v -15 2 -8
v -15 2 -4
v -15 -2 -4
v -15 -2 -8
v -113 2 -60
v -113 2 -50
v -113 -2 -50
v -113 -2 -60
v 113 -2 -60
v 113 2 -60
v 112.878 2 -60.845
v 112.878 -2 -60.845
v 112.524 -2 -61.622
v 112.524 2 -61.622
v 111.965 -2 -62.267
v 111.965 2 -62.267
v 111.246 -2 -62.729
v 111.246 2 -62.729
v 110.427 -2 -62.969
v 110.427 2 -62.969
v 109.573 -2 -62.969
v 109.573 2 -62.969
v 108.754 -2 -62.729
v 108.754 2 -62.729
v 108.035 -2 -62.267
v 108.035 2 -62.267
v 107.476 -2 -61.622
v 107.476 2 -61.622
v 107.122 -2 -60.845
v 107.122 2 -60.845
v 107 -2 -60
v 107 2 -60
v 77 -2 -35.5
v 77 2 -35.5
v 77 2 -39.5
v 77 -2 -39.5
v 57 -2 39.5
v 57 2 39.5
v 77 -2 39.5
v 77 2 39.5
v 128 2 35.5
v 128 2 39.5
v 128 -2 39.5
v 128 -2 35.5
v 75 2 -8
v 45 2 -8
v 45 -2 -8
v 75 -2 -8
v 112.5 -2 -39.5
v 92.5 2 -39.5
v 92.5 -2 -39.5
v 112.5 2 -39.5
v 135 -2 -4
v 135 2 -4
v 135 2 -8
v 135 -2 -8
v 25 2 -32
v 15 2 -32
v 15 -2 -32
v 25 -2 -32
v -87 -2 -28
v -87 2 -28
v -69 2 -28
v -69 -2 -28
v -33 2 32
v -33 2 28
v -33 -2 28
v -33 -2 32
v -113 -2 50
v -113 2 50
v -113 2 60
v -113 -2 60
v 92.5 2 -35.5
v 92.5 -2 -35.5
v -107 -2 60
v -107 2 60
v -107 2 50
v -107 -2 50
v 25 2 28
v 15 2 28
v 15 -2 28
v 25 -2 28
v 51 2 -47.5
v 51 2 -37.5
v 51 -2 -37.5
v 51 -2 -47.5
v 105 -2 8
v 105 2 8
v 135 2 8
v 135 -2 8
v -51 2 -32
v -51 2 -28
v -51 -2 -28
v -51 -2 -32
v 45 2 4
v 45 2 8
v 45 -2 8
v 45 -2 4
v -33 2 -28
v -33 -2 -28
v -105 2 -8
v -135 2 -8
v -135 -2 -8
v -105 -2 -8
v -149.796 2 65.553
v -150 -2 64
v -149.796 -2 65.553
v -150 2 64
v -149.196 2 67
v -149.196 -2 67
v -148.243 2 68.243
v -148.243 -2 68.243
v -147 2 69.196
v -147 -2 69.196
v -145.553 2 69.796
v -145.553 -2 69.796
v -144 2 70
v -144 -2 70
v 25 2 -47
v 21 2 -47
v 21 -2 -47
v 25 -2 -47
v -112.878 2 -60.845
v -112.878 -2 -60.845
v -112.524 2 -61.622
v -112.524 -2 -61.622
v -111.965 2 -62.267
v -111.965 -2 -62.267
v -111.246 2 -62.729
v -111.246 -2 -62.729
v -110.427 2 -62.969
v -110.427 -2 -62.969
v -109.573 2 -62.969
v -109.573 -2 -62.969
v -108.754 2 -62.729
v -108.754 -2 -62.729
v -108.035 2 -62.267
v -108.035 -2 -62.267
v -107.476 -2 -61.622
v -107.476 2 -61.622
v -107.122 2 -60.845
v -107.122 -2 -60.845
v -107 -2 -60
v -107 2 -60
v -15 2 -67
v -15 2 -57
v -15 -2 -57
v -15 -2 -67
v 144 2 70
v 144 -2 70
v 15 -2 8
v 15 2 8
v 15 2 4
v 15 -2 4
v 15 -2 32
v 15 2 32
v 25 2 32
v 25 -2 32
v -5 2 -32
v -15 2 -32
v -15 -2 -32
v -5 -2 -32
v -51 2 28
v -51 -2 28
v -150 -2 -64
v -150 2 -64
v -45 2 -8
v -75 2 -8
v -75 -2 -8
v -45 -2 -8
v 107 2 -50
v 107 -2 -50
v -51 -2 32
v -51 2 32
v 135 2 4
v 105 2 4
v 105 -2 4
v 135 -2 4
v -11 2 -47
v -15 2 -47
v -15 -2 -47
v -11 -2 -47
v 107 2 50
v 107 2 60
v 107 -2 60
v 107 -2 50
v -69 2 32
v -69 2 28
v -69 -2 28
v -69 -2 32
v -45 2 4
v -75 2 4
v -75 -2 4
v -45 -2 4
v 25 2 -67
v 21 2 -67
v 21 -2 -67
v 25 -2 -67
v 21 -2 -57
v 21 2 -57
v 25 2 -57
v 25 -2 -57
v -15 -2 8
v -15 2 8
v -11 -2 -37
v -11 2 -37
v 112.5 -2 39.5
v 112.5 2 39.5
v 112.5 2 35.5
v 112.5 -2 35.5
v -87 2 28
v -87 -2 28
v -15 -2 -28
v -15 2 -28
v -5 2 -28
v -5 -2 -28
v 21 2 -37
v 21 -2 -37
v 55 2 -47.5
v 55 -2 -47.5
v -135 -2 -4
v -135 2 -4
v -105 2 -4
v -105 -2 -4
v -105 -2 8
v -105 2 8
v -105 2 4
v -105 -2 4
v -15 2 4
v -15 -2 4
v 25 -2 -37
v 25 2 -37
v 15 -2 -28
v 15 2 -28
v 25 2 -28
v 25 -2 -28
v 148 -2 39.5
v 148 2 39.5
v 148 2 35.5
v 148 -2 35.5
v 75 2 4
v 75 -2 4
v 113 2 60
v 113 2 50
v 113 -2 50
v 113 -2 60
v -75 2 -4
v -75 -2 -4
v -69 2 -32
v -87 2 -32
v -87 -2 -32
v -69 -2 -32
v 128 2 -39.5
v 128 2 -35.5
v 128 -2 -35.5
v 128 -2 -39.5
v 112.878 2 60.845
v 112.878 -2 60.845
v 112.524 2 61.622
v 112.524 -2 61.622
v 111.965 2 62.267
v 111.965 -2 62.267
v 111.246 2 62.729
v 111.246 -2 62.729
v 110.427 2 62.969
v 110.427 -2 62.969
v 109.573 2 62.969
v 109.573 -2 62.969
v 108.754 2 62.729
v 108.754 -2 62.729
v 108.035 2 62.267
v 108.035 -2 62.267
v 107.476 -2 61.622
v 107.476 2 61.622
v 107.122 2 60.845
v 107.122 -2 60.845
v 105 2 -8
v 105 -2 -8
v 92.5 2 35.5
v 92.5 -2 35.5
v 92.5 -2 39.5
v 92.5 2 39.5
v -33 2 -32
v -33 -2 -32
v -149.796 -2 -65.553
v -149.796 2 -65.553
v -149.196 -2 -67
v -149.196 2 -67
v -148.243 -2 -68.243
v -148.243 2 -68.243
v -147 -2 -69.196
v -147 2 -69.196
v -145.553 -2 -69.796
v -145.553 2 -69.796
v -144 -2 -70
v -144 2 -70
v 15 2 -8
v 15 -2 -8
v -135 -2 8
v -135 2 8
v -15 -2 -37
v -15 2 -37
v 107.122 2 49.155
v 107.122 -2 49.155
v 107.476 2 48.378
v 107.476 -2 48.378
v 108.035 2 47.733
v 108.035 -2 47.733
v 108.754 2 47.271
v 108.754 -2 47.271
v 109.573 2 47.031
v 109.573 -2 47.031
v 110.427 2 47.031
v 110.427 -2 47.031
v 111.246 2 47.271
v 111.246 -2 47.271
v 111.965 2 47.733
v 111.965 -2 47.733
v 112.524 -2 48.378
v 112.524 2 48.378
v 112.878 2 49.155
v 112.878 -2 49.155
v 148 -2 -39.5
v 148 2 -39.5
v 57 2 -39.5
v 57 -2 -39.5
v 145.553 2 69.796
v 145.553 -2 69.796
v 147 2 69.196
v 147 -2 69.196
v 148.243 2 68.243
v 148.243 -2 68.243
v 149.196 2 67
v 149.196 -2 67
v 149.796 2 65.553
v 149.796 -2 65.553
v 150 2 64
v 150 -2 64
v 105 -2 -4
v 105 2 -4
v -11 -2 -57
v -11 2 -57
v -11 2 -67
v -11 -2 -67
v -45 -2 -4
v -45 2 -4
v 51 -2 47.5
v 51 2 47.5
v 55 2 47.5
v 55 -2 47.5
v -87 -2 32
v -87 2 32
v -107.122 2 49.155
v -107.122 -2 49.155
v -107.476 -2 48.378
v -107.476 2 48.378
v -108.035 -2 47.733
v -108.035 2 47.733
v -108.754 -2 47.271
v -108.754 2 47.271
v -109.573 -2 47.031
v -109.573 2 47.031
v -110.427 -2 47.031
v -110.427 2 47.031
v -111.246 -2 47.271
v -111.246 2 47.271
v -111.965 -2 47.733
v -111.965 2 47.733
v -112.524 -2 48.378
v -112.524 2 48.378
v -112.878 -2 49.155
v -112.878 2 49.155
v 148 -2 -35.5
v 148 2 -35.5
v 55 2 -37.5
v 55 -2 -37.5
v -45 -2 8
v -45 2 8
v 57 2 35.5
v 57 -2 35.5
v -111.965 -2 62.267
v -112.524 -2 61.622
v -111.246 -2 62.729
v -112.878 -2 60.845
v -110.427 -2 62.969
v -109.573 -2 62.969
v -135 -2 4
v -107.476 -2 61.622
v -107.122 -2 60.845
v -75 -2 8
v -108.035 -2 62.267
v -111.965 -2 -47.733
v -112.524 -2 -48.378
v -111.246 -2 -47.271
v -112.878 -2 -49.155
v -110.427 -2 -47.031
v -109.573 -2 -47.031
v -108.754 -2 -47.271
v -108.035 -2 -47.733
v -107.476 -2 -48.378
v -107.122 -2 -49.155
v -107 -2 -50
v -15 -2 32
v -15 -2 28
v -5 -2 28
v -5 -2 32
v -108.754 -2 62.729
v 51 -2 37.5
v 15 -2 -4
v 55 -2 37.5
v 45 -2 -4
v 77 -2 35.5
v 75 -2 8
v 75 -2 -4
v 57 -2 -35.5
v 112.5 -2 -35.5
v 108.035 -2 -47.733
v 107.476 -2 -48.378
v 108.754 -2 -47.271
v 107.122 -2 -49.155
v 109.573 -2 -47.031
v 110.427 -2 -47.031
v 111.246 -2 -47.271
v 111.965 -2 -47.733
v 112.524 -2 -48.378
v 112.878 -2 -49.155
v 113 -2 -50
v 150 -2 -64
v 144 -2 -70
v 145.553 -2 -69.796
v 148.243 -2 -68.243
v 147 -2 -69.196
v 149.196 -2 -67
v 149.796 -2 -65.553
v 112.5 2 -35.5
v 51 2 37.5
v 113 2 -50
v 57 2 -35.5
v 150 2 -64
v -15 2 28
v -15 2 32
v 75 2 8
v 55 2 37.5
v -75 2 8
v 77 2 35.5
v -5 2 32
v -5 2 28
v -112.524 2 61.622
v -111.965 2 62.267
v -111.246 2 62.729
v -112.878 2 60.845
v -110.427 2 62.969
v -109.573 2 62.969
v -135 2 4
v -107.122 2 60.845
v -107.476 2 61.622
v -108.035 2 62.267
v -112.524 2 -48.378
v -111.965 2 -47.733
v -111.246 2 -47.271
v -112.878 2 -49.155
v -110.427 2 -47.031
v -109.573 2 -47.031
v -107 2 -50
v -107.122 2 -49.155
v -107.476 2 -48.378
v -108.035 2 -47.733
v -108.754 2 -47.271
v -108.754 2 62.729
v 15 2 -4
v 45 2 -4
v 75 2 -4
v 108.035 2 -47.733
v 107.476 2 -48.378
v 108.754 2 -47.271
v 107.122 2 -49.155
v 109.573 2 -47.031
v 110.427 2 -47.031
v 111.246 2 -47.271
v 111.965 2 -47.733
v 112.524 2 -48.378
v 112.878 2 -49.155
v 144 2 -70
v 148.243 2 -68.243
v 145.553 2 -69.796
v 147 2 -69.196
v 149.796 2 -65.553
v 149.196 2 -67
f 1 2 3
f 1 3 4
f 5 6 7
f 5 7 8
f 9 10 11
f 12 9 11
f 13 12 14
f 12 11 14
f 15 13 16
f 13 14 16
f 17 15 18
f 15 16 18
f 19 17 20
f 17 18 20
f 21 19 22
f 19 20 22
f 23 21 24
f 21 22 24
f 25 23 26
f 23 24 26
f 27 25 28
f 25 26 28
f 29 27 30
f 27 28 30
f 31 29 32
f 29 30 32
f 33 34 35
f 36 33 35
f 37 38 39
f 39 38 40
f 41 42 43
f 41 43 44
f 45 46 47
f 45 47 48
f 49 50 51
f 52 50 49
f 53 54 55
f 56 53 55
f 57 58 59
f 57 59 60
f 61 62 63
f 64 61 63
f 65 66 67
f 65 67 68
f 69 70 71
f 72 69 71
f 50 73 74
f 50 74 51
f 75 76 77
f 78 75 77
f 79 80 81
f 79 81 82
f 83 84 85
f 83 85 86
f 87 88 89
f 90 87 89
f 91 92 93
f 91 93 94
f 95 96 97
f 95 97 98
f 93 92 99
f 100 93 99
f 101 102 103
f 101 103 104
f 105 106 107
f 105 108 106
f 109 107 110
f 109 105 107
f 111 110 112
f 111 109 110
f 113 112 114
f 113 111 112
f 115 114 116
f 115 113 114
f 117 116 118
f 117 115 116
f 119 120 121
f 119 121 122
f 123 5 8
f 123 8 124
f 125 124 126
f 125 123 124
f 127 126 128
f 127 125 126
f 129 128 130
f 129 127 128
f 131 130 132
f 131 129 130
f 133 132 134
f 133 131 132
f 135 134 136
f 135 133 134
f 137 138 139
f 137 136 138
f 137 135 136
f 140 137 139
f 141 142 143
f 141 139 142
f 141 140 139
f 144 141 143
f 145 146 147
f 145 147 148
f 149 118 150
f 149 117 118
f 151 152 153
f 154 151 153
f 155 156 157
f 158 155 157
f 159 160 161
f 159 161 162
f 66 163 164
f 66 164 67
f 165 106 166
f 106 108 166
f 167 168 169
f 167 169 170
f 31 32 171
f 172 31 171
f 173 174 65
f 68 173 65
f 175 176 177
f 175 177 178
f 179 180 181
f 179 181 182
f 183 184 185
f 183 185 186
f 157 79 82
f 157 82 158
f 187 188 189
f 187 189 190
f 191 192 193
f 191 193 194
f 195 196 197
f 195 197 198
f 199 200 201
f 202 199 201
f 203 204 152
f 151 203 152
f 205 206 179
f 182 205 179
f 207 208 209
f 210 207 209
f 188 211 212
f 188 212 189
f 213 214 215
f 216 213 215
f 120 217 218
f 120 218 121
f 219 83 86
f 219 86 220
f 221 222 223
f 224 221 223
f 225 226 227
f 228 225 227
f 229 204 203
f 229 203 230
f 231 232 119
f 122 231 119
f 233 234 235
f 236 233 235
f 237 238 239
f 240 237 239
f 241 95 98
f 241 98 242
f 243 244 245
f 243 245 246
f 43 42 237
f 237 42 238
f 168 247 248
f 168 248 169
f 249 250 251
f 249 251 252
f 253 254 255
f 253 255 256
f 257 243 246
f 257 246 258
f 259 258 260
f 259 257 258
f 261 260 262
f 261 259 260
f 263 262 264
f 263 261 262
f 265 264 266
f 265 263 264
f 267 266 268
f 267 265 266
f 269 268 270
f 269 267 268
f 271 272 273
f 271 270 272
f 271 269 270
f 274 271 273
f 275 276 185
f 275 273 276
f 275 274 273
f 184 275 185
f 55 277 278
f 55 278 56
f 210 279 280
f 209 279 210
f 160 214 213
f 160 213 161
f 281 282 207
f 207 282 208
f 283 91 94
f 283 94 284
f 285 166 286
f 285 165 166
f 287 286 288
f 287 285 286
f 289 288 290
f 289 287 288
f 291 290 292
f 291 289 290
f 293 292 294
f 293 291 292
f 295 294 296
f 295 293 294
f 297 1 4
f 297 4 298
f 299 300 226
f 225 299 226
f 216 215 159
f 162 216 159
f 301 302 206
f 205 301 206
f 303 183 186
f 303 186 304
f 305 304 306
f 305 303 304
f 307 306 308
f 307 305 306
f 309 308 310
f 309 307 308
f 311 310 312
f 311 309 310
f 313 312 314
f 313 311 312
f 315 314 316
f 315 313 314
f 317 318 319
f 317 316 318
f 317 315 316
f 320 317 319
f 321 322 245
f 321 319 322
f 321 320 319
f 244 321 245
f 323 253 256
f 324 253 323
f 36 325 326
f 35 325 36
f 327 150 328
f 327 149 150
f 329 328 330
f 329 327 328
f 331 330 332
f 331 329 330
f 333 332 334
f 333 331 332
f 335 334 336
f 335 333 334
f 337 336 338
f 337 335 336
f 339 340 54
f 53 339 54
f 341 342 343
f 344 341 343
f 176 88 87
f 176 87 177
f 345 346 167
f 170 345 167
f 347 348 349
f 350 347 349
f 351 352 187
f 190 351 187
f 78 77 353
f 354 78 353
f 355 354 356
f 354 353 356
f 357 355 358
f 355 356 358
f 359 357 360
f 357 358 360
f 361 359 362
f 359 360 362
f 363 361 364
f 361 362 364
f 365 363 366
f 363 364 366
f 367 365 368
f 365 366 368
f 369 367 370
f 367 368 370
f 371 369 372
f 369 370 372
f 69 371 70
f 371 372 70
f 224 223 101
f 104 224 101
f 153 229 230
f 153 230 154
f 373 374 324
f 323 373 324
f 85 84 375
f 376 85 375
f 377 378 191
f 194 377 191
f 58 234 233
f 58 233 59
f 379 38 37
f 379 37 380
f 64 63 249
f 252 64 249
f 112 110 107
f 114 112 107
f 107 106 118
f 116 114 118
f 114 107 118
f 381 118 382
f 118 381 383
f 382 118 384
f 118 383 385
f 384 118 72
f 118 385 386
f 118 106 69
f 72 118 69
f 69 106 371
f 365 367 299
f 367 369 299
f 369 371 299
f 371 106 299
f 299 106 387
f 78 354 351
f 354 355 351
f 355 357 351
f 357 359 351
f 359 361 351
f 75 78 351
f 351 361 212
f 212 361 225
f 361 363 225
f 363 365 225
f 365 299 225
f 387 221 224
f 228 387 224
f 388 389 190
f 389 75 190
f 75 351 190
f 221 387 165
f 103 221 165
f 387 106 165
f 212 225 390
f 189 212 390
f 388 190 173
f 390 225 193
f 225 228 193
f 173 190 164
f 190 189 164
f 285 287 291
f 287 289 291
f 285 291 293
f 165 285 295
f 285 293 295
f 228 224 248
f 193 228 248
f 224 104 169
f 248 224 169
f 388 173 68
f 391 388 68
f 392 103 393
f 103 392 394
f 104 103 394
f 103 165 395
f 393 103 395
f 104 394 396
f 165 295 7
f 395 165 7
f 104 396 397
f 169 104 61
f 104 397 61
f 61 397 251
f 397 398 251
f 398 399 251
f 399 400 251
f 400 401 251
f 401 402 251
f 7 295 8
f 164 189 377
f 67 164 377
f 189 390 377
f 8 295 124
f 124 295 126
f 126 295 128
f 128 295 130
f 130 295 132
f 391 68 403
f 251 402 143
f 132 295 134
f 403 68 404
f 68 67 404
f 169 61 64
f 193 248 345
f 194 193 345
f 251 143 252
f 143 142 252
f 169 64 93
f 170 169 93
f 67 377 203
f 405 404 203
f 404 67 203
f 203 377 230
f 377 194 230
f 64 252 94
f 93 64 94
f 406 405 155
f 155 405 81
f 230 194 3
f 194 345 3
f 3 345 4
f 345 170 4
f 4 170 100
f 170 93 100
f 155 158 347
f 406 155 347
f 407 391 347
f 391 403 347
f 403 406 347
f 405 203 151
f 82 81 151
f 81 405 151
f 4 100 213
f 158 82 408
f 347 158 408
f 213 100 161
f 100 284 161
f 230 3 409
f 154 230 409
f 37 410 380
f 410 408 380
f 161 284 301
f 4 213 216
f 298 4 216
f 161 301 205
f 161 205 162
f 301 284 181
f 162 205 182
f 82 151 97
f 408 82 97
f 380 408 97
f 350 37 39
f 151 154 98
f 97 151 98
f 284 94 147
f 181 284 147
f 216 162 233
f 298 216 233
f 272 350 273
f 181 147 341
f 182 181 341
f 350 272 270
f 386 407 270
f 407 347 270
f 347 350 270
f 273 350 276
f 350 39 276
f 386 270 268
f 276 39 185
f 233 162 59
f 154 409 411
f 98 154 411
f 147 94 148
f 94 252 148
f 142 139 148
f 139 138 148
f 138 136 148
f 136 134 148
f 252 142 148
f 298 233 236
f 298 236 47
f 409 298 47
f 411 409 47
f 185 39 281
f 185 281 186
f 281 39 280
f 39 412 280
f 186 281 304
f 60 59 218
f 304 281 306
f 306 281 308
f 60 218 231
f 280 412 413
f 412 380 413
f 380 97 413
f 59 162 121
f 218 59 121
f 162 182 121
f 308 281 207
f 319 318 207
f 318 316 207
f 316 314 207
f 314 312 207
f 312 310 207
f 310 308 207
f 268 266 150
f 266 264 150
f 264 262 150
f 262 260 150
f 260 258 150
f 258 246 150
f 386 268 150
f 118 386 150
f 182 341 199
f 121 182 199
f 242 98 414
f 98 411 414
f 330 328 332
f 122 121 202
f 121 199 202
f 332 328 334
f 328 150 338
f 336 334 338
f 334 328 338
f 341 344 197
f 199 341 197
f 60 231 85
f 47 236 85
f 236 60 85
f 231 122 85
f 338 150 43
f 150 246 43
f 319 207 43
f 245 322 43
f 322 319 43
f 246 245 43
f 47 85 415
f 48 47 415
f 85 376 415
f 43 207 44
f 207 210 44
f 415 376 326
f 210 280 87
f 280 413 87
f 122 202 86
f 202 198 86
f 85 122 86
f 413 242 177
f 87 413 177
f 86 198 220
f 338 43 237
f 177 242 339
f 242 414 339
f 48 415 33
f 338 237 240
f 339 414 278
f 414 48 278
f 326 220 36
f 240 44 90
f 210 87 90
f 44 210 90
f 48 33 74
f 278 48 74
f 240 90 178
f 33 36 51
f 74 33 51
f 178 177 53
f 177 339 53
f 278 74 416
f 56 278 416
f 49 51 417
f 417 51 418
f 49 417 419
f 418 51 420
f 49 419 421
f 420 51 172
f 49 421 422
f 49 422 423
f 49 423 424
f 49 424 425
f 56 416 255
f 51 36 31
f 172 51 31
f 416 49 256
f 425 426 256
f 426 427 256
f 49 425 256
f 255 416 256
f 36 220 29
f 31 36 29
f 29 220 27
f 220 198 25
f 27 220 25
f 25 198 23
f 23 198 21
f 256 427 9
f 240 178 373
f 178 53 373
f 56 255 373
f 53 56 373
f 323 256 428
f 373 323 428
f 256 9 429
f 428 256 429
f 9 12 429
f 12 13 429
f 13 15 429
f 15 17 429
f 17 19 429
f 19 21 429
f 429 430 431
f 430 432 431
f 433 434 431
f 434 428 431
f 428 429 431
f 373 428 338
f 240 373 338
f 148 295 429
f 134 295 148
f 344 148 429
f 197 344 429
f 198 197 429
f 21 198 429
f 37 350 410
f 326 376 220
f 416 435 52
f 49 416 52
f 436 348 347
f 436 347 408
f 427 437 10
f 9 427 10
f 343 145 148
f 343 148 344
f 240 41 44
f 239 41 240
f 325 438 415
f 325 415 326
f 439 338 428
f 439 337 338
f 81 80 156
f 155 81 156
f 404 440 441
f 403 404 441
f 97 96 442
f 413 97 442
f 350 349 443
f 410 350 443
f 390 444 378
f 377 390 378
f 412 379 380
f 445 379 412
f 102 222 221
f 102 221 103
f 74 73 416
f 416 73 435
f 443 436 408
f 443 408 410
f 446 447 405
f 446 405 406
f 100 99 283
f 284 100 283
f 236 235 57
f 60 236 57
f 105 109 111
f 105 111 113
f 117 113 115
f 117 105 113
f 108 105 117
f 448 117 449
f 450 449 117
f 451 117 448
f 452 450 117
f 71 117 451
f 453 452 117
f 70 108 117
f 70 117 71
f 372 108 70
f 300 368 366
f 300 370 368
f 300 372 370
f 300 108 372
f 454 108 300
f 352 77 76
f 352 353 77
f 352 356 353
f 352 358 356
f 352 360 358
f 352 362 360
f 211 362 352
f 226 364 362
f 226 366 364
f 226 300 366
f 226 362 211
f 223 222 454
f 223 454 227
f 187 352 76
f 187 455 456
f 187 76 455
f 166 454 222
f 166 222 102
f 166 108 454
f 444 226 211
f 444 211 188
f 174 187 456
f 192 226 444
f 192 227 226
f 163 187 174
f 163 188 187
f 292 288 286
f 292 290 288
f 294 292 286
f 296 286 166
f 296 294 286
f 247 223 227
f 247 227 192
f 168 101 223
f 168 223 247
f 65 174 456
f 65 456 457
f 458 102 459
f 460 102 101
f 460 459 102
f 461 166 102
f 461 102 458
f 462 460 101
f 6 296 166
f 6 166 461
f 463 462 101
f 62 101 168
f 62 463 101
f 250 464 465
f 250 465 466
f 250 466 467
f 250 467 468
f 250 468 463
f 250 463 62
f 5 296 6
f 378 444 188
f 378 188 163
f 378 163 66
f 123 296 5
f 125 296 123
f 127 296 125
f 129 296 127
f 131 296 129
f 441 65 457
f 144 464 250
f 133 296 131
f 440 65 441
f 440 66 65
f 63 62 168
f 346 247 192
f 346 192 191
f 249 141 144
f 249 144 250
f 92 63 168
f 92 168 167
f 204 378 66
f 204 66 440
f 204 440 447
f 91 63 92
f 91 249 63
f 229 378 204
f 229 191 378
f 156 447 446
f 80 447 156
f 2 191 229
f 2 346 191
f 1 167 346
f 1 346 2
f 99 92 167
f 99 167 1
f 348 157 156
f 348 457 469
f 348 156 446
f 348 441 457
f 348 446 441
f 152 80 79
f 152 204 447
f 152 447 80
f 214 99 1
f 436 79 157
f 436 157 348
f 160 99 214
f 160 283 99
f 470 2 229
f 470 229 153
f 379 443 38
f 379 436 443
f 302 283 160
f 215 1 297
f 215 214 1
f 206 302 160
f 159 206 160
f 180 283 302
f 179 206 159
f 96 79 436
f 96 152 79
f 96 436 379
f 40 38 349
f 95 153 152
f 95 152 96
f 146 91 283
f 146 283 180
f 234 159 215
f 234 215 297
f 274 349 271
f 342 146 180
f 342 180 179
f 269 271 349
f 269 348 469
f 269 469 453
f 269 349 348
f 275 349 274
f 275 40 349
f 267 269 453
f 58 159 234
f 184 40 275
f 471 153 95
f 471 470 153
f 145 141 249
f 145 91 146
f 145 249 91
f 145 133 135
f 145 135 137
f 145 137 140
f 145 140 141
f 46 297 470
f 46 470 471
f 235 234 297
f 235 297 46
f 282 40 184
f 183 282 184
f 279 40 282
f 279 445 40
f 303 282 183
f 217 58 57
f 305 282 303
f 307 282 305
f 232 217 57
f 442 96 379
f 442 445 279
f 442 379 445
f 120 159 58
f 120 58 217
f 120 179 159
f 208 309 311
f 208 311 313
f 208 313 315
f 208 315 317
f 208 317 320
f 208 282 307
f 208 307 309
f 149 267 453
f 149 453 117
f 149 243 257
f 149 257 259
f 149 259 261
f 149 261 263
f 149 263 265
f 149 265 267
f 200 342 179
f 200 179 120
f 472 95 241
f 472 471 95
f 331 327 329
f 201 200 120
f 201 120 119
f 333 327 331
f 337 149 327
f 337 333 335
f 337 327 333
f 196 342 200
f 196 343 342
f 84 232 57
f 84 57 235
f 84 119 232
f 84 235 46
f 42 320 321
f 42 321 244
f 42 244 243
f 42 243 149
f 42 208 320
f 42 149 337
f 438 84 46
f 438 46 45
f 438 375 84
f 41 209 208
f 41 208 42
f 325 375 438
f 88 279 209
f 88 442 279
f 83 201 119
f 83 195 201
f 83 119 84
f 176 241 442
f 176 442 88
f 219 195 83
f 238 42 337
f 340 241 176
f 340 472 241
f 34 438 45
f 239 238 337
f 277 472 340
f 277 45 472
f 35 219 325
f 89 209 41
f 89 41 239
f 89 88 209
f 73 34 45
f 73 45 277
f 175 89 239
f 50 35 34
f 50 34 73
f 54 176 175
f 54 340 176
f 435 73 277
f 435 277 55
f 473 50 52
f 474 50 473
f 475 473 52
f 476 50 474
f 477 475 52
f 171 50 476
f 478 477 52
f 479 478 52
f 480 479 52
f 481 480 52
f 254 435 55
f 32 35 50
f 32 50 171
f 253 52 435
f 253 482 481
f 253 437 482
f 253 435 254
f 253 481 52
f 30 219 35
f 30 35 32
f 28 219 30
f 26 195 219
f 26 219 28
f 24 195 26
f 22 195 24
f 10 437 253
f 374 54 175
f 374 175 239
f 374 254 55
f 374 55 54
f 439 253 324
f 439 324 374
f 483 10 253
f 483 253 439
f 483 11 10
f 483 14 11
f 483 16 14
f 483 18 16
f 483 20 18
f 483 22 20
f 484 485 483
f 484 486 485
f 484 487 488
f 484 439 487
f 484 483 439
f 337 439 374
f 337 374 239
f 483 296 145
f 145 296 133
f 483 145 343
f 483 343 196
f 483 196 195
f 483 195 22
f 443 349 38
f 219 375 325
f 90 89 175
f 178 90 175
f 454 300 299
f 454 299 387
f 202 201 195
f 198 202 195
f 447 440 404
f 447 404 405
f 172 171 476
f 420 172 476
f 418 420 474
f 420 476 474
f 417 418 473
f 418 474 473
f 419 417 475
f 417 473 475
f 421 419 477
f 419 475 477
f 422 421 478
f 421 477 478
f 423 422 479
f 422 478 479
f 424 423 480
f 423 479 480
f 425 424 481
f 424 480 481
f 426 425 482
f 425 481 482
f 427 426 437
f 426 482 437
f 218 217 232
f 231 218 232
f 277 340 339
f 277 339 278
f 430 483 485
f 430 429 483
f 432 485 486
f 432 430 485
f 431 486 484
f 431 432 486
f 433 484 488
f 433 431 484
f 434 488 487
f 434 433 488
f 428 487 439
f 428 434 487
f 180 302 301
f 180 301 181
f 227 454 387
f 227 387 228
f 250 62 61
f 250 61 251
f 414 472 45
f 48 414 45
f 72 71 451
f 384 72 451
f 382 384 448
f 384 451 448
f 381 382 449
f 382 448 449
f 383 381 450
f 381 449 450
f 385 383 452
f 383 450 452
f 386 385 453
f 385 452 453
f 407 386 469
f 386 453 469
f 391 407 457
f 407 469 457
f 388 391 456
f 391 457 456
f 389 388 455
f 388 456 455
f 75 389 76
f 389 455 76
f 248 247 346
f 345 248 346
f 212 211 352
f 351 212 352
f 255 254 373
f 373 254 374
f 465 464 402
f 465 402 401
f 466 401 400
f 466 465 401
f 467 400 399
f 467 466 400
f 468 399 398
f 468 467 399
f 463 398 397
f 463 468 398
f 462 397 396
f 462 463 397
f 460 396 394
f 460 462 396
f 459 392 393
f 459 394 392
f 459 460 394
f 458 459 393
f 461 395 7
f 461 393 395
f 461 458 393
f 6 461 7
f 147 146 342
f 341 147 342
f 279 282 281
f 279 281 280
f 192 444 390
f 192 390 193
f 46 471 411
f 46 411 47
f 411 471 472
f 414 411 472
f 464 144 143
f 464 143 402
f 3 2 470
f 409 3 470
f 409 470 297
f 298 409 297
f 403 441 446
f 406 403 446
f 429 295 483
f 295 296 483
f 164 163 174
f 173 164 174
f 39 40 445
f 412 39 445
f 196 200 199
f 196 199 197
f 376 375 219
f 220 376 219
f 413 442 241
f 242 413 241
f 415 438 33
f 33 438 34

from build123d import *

# Parameters (mm, degrees)
SKETCH1_W           = 300
SKETCH1_H           = 140
BOSS_EXTRUDE1_DEPTH = 2
CUT_EXTRUDE1_REACH  = 167.578
CUT_EXTRUDE2_REACH  = 167.578
SKETCH3_W           = 30
SKETCH3_H           = 4
FILLET1_R           = 6
SKETCH4_W           = 10
SKETCH4_H           = 4
CUT_EXTRUDE3_DEPTH  = 166.577776287
SKETCH5_W           = 4
SKETCH5_H           = 10
CUT_EXTRUDE4_DEPTH  = 166.577776287
SKETCH6_W           = 18
SKETCH6_H           = 4
CUT_EXTRUDE5_DEPTH  = 166.577776287
SKETCH7_W           = 20
SKETCH7_H           = 4
SKETCH7_W_2         = 4
SKETCH7_H_2         = 10
CUT_EXTRUDE6_DEPTH  = 166.577776287


with BuildPart() as part:
    # Sketch1 → Boss-Extrude1 (new, symmetric)
    with BuildSketch(Plane(origin=(0, 0, 0), x_dir=(1, 0, 0), z_dir=(0, 1, 0))):
        Rectangle(SKETCH1_W, SKETCH1_H)
    extrude(amount=BOSS_EXTRUDE1_DEPTH, both=True)

    # Sketch2 → Cut-Extrude1 (cut, up to next)
    with BuildSketch(Plane(origin=(0, 2, 0), x_dir=(1, 0, 0), z_dir=(0, 1, 0)), mode=Mode.PRIVATE) as cut_extrude1_sk1:
        with BuildLine():
            Line((-107, 60), (-107, 50))
            ThreePointArc((-107, 50), (-110, 47), (-113, 50))
            Line((-113, 50), (-113, 60))
            ThreePointArc((-113, 60), (-110, 63), (-107, 60))
        make_face()
    cut_extrude1_tool1 = extrude(cut_extrude1_sk1.sketch, amount=-CUT_EXTRUDE1_REACH, mode=Mode.PRIVATE) & part.part
    # Sketch2 → Cut-Extrude1 (cut, up to next)
    with BuildSketch(Plane(origin=(0, 2, 0), x_dir=(1, 0, 0), z_dir=(0, 1, 0)), mode=Mode.PRIVATE) as cut_extrude1_sk2:
        with BuildLine():
            Line((107, 60), (107, 50))
            ThreePointArc((107, 50), (110, 47), (113, 50))
            Line((113, 50), (113, 60))
            ThreePointArc((113, 60), (110, 63), (107, 60))
        make_face()
    cut_extrude1_tool2 = extrude(cut_extrude1_sk2.sketch, amount=-CUT_EXTRUDE1_REACH, mode=Mode.PRIVATE) & part.part
    # Sketch2 → Cut-Extrude1 (cut, up to next)
    with BuildSketch(Plane(origin=(0, 2, 0), x_dir=(1, 0, 0), z_dir=(0, 1, 0)), mode=Mode.PRIVATE) as cut_extrude1_sk3:
        with BuildLine():
            Line((107, -60), (107, -50))
            ThreePointArc((107, -50), (110, -47), (113, -50))
            Line((113, -50), (113, -60))
            ThreePointArc((113, -60), (110, -63), (107, -60))
        make_face()
    cut_extrude1_tool3 = extrude(cut_extrude1_sk3.sketch, amount=-CUT_EXTRUDE1_REACH, mode=Mode.PRIVATE) & part.part
    # Sketch2 → Cut-Extrude1 (cut, up to next)
    with BuildSketch(Plane(origin=(0, 2, 0), x_dir=(1, 0, 0), z_dir=(0, 1, 0)), mode=Mode.PRIVATE) as cut_extrude1_sk4:
        with BuildLine():
            Line((-107, -60), (-107, -50))
            ThreePointArc((-107, -50), (-110, -47), (-113, -50))
            Line((-113, -50), (-113, -60))
            ThreePointArc((-113, -60), (-110, -63), (-107, -60))
        make_face()
    cut_extrude1_tool4 = extrude(cut_extrude1_sk4.sketch, amount=-CUT_EXTRUDE1_REACH, mode=Mode.PRIVATE) & part.part
    add(cut_extrude1_tool1.solids().sort_by_distance((-110, 2, -55))[0], mode=Mode.SUBTRACT)
    add(cut_extrude1_tool2.solids().sort_by_distance((110, 2, -55))[0], mode=Mode.SUBTRACT)
    add(cut_extrude1_tool3.solids().sort_by_distance((110, 2, 55))[0], mode=Mode.SUBTRACT)
    add(cut_extrude1_tool4.solids().sort_by_distance((-110, 2, 55))[0], mode=Mode.SUBTRACT)

    # Sketch3 → Cut-Extrude2 (cut, up to next)
    with BuildSketch(Plane(origin=(0, 2, 0), x_dir=(1, 0, 0), z_dir=(0, 1, 0)), mode=Mode.PRIVATE) as cut_extrude2_sk1:
        with Locations((-60, 6)):
            Rectangle(SKETCH3_W, SKETCH3_H)
    cut_extrude2_tool1 = extrude(cut_extrude2_sk1.sketch, amount=-CUT_EXTRUDE2_REACH, mode=Mode.PRIVATE) & part.part
    # Sketch3 → Cut-Extrude2 (cut, up to next)
    with BuildSketch(Plane(origin=(0, 2, 0), x_dir=(1, 0, 0), z_dir=(0, 1, 0)), mode=Mode.PRIVATE) as cut_extrude2_sk2:
        with Locations((-120, 6)):
            Rectangle(SKETCH3_W, SKETCH3_H)
    cut_extrude2_tool2 = extrude(cut_extrude2_sk2.sketch, amount=-CUT_EXTRUDE2_REACH, mode=Mode.PRIVATE) & part.part
    # Sketch3 → Cut-Extrude2 (cut, up to next)
    with BuildSketch(Plane(origin=(0, 2, 0), x_dir=(1, 0, 0), z_dir=(0, 1, 0)), mode=Mode.PRIVATE) as cut_extrude2_sk3:
        with Locations((0, 6)):
            Rectangle(SKETCH3_W, SKETCH3_H)
    cut_extrude2_tool3 = extrude(cut_extrude2_sk3.sketch, amount=-CUT_EXTRUDE2_REACH, mode=Mode.PRIVATE) & part.part
    # Sketch3 → Cut-Extrude2 (cut, up to next)
    with BuildSketch(Plane(origin=(0, 2, 0), x_dir=(1, 0, 0), z_dir=(0, 1, 0)), mode=Mode.PRIVATE) as cut_extrude2_sk4:
        with Locations((60, 6)):
            Rectangle(SKETCH3_W, SKETCH3_H)
    cut_extrude2_tool4 = extrude(cut_extrude2_sk4.sketch, amount=-CUT_EXTRUDE2_REACH, mode=Mode.PRIVATE) & part.part
    # Sketch3 → Cut-Extrude2 (cut, up to next)
    with BuildSketch(Plane(origin=(0, 2, 0), x_dir=(1, 0, 0), z_dir=(0, 1, 0)), mode=Mode.PRIVATE) as cut_extrude2_sk5:
        with Locations((120, 6)):
            Rectangle(SKETCH3_W, SKETCH3_H)
    cut_extrude2_tool5 = extrude(cut_extrude2_sk5.sketch, amount=-CUT_EXTRUDE2_REACH, mode=Mode.PRIVATE) & part.part
    # Sketch3 → Cut-Extrude2 (cut, up to next)
    with BuildSketch(Plane(origin=(0, 2, 0), x_dir=(1, 0, 0), z_dir=(0, 1, 0)), mode=Mode.PRIVATE) as cut_extrude2_sk6:
        with Locations((120, -6)):
            Rectangle(SKETCH3_W, SKETCH3_H)
    cut_extrude2_tool6 = extrude(cut_extrude2_sk6.sketch, amount=-CUT_EXTRUDE2_REACH, mode=Mode.PRIVATE) & part.part
    # Sketch3 → Cut-Extrude2 (cut, up to next)
    with BuildSketch(Plane(origin=(0, 2, 0), x_dir=(1, 0, 0), z_dir=(0, 1, 0)), mode=Mode.PRIVATE) as cut_extrude2_sk7:
        with Locations((60, -6)):
            Rectangle(SKETCH3_W, SKETCH3_H)
    cut_extrude2_tool7 = extrude(cut_extrude2_sk7.sketch, amount=-CUT_EXTRUDE2_REACH, mode=Mode.PRIVATE) & part.part
    # Sketch3 → Cut-Extrude2 (cut, up to next)
    with BuildSketch(Plane(origin=(0, 2, 0), x_dir=(1, 0, 0), z_dir=(0, 1, 0)), mode=Mode.PRIVATE) as cut_extrude2_sk8:
        with Locations((0, -6)):
            Rectangle(SKETCH3_W, SKETCH3_H)
    cut_extrude2_tool8 = extrude(cut_extrude2_sk8.sketch, amount=-CUT_EXTRUDE2_REACH, mode=Mode.PRIVATE) & part.part
    # Sketch3 → Cut-Extrude2 (cut, up to next)
    with BuildSketch(Plane(origin=(0, 2, 0), x_dir=(1, 0, 0), z_dir=(0, 1, 0)), mode=Mode.PRIVATE) as cut_extrude2_sk9:
        with Locations((-60, -6)):
            Rectangle(SKETCH3_W, SKETCH3_H)
    cut_extrude2_tool9 = extrude(cut_extrude2_sk9.sketch, amount=-CUT_EXTRUDE2_REACH, mode=Mode.PRIVATE) & part.part
    # Sketch3 → Cut-Extrude2 (cut, up to next)
    with BuildSketch(Plane(origin=(0, 2, 0), x_dir=(1, 0, 0), z_dir=(0, 1, 0)), mode=Mode.PRIVATE) as cut_extrude2_sk10:
        with Locations((-120, -6)):
            Rectangle(SKETCH3_W, SKETCH3_H)
    cut_extrude2_tool10 = extrude(cut_extrude2_sk10.sketch, amount=-CUT_EXTRUDE2_REACH, mode=Mode.PRIVATE) & part.part
    add(cut_extrude2_tool1.solids().sort_by_distance((-60, 2, -6))[0], mode=Mode.SUBTRACT)
    add(cut_extrude2_tool2.solids().sort_by_distance((-120, 2, -6))[0], mode=Mode.SUBTRACT)
    add(cut_extrude2_tool3.solids().sort_by_distance((0, 2, -6))[0], mode=Mode.SUBTRACT)
    add(cut_extrude2_tool4.solids().sort_by_distance((60, 2, -6))[0], mode=Mode.SUBTRACT)
    add(cut_extrude2_tool5.solids().sort_by_distance((120, 2, -6))[0], mode=Mode.SUBTRACT)
    add(cut_extrude2_tool6.solids().sort_by_distance((120, 2, 6))[0], mode=Mode.SUBTRACT)
    add(cut_extrude2_tool7.solids().sort_by_distance((60, 2, 6))[0], mode=Mode.SUBTRACT)
    add(cut_extrude2_tool8.solids().sort_by_distance((0, 2, 6))[0], mode=Mode.SUBTRACT)
    add(cut_extrude2_tool9.solids().sort_by_distance((-60, 2, 6))[0], mode=Mode.SUBTRACT)
    add(cut_extrude2_tool10.solids().sort_by_distance((-120, 2, 6))[0], mode=Mode.SUBTRACT)

    # Fillet1
    fillet1_edges = [part.edges().sort_by_distance(p)[0] for p in [
        (150, 0, 70),
        (-150, 0, 70),
        (-150, 0, -70),
        (150, 0, -70),
    ]]
    fillet(fillet1_edges, radius=FILLET1_R)

    # Sketch4 → Cut-Extrude3 (cut, through all)
    with BuildSketch(Plane(origin=(0, 2, 0), x_dir=(1, 0, 0), z_dir=(0, 1, 0))):
        with Locations((20, 30)):
            Rectangle(SKETCH4_W, SKETCH4_H)
        with Locations((-10, 30)):
            Rectangle(SKETCH4_W, SKETCH4_H)
    cut_extrude3 = extrude(amount=-CUT_EXTRUDE3_DEPTH, mode=Mode.SUBTRACT)

    # Sketch5 → Cut-Extrude4 (cut, through all)
    with BuildSketch(Plane(origin=(0, 2, 0), x_dir=(1, 0, 0), z_dir=(0, 1, 0))):
        with Locations((23, 42)):
            Rectangle(SKETCH5_W, SKETCH5_H)
        with Locations((-13, 42)):
            Rectangle(SKETCH5_W, SKETCH5_H)
        with Locations((-13, 62)):
            Rectangle(SKETCH5_W, SKETCH5_H)
        with Locations((23, 62)):
            Rectangle(SKETCH5_W, SKETCH5_H)
    extrude(amount=-CUT_EXTRUDE4_DEPTH, mode=Mode.SUBTRACT)

    # Sketch6 → Cut-Extrude5 (cut, through all)
    with BuildSketch(Plane(origin=(0, 2, 0), x_dir=(1, 0, 0), z_dir=(0, 1, 0))):
        with Locations((-42, 30)):
            Rectangle(SKETCH6_W, SKETCH6_H)
        with Locations((-78, 30)):
            Rectangle(SKETCH6_W, SKETCH6_H)
    cut_extrude5 = extrude(amount=-CUT_EXTRUDE5_DEPTH, mode=Mode.SUBTRACT)

    # Mirror1: Cut-Extrude3, Cut-Extrude5 across plane
    add(cut_extrude3.mirror(Plane.XY), mode=Mode.SUBTRACT)
    add(cut_extrude5.mirror(Plane.XY), mode=Mode.SUBTRACT)

    # Sketch7 → Cut-Extrude6 (cut, through all)
    with BuildSketch(Plane(origin=(0, 2, 0), x_dir=(1, 0, 0), z_dir=(0, 1, 0))):
        with Locations((67, 37.5)):
            Rectangle(SKETCH7_W, SKETCH7_H)
        with Locations((102.5, 37.5)):
            Rectangle(SKETCH7_W, SKETCH7_H)
        with Locations((138, 37.5)):
            Rectangle(SKETCH7_W, SKETCH7_H)
        with Locations((67, -37.5)):
            Rectangle(SKETCH7_W, SKETCH7_H)
        with Locations((102.5, -37.5)):
            Rectangle(SKETCH7_W, SKETCH7_H)
        with Locations((138, -37.5)):
            Rectangle(SKETCH7_W, SKETCH7_H)
        with Locations((53, 42.5)):
            Rectangle(SKETCH7_W_2, SKETCH7_H_2)
        with Locations((53, -42.5)):
            Rectangle(SKETCH7_W_2, SKETCH7_H_2)
    extrude(amount=-CUT_EXTRUDE6_DEPTH, mode=Mode.SUBTRACT)


solid = part.part
